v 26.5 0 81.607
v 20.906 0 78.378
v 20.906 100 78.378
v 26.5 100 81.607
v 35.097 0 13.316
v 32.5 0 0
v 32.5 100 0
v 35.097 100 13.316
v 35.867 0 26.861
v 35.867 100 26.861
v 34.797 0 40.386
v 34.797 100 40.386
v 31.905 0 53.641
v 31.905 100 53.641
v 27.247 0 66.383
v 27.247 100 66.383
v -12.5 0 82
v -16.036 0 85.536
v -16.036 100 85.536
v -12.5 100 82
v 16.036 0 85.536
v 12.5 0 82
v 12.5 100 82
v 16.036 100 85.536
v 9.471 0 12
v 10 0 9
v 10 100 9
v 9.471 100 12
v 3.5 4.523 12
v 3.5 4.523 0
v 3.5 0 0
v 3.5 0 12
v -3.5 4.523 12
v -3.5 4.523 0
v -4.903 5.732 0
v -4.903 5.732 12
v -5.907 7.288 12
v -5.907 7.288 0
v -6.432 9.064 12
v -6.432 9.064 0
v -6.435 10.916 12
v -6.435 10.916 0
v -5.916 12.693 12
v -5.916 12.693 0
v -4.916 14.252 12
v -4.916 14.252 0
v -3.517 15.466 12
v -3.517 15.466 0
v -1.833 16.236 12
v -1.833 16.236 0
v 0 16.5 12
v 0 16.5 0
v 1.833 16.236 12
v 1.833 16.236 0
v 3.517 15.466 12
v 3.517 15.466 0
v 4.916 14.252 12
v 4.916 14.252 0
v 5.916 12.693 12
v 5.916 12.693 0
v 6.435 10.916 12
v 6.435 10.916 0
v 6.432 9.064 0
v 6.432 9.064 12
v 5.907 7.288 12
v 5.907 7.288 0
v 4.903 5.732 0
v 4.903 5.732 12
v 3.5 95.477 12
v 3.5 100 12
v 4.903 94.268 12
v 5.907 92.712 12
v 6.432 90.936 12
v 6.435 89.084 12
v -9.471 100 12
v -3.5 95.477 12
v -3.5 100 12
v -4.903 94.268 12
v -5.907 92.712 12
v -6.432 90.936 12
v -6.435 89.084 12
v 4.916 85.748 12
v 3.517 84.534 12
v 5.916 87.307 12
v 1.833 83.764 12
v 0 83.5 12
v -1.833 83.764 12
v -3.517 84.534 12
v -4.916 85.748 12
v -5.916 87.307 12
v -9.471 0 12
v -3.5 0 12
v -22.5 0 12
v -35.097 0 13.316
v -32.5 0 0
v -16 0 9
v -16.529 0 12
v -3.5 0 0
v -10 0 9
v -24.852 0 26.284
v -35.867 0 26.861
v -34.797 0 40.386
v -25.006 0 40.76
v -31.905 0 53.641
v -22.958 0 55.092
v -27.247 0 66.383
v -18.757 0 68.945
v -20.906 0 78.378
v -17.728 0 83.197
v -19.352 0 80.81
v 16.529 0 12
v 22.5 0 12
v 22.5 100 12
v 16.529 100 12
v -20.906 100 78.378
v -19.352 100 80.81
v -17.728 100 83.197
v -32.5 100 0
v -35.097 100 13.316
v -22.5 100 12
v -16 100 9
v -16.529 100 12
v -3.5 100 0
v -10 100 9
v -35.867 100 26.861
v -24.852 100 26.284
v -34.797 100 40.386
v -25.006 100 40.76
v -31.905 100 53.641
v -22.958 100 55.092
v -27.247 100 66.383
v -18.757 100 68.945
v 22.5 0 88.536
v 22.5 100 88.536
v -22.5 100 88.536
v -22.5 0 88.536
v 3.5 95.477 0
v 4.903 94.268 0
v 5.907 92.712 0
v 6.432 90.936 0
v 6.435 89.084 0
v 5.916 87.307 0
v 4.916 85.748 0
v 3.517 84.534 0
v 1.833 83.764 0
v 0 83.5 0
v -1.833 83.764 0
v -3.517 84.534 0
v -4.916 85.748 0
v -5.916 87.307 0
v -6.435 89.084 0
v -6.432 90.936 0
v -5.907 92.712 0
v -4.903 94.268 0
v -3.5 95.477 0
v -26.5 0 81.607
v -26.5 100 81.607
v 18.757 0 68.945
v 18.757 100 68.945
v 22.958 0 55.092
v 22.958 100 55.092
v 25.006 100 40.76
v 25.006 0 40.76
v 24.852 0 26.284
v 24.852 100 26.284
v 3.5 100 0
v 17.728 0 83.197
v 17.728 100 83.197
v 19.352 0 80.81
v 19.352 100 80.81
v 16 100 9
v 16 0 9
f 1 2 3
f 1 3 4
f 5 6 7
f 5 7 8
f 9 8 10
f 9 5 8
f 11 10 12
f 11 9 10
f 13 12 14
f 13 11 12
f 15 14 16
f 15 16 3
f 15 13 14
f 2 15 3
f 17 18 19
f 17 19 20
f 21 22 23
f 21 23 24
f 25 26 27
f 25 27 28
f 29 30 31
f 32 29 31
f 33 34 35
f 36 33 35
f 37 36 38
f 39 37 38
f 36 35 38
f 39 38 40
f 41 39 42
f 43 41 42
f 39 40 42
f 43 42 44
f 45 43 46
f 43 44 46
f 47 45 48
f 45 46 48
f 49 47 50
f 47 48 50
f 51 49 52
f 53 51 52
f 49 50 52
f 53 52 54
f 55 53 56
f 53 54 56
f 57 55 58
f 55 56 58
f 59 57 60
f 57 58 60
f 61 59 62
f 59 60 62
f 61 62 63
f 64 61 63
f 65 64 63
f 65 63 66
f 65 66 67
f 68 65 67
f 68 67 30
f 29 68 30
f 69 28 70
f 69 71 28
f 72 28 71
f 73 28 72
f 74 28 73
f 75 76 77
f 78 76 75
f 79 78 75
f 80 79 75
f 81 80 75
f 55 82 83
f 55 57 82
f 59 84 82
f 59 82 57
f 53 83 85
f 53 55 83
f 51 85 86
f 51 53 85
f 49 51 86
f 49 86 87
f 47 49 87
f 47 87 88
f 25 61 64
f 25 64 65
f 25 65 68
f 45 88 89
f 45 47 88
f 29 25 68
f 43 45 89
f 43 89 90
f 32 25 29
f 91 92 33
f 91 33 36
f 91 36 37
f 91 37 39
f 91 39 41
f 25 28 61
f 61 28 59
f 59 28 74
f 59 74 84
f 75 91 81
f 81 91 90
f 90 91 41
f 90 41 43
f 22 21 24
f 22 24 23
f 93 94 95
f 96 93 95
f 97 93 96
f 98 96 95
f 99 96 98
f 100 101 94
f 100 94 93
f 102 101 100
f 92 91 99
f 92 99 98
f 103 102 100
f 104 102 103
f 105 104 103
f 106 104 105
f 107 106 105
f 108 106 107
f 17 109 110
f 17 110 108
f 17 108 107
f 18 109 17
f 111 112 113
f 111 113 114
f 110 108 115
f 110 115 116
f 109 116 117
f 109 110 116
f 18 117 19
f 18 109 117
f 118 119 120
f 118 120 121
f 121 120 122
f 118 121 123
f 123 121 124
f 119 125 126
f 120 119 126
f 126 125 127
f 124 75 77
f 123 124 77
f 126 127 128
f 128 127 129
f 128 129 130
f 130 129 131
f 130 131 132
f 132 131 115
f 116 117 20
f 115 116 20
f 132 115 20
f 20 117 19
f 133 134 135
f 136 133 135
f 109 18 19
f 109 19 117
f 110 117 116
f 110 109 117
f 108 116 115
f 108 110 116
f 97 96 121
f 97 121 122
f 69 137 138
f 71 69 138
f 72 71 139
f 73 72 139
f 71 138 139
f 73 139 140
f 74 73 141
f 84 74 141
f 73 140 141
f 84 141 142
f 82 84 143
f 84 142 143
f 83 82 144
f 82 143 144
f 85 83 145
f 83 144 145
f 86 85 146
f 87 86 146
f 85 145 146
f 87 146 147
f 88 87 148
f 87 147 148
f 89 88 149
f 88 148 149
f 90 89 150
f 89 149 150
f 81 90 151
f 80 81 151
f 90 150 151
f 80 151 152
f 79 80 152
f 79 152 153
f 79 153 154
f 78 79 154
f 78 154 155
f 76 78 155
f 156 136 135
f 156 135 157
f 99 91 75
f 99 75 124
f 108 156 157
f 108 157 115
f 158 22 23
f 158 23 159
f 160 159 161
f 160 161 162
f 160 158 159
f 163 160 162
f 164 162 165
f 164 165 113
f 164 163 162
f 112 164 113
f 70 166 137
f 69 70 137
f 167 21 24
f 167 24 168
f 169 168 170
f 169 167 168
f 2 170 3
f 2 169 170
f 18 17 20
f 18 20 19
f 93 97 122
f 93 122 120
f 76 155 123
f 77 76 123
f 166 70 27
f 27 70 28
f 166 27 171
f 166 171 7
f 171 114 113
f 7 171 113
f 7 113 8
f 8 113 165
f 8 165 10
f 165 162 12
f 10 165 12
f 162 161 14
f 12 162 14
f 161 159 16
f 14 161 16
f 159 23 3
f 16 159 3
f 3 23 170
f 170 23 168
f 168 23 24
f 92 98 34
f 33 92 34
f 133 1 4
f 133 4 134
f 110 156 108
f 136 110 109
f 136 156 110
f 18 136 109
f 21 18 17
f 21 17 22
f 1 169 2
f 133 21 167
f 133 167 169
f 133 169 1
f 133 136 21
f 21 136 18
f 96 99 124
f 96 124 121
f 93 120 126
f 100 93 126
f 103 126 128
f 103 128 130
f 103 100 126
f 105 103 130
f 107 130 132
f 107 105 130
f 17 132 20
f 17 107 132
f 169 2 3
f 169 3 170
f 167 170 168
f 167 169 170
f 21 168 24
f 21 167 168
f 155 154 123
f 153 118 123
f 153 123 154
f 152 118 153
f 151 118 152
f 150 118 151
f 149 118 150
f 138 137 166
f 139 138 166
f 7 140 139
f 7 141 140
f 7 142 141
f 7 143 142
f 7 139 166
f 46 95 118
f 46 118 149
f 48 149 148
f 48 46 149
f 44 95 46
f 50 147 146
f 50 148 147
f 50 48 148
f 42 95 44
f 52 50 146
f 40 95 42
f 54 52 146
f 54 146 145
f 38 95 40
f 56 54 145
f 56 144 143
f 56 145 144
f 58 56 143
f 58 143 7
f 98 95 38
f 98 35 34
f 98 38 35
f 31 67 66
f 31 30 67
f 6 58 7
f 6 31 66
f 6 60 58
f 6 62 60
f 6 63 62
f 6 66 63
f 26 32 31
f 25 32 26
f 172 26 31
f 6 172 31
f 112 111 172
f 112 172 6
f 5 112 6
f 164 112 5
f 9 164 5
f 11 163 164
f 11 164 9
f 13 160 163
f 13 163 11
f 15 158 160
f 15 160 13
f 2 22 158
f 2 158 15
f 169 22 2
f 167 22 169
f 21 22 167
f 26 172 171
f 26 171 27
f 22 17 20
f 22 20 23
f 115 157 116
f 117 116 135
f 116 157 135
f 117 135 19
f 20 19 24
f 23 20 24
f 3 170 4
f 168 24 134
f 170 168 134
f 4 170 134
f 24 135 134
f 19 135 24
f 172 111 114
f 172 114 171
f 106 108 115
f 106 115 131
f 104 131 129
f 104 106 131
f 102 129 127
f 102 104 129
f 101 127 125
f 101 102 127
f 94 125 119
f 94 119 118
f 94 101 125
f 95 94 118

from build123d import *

# Parameters (mm, degrees)
F1_DEPTH = 100
F2_DEPTH = 100
F4_DEPTH = 25


with BuildPart() as f1:
    # F0 (on Front) → F1 (new body)
    with BuildSketch(Plane.XZ):
        with BuildLine():
            Line((-16.528981, 12), (-22.5, 12))
            ThreePointArc((-22.5, 12), (-24.255455, 47.965065), (-12.5, 82))
            Line((-12.5, 82), (-16.035534, 85.535534))
            ThreePointArc((-16.035534, 85.535534), (-18.548312, 82.009344), (-20.906089, 78.377685))
            ThreePointArc((-20.906089, 78.377685), (-34.796514, 40.386058), (-32.5, 0))
            Line((-32.5, 0), (32.5, 0))
            ThreePointArc((32.5, 0), (34.796514, 40.386058), (20.906089, 78.377685))
            ThreePointArc((20.906089, 78.377685), (18.548312, 82.009344), (16.035534, 85.535534))
            Line((16.035534, 85.535534), (12.5, 82))
            ThreePointArc((12.5, 82), (24.255455, 47.965065), (22.5, 12))
            Line((22.5, 12), (16.528981, 12))
            Line((16.528981, 12), (16, 9))
            Line((16, 9), (10, 9))
            Line((10, 9), (9.471019, 12))
            Line((9.471019, 12), (-9.471019, 12))
            Line((-9.471019, 12), (-10, 9))
            Line((-10, 9), (-16, 9))
            Line((-16, 9), (-16.528981, 12))
        make_face()
    extrude(amount=-F1_DEPTH)

    # F3 (on face) → F4 (cut)
    with BuildSketch(Plane(origin=(0, 0, 0), x_dir=(1, 0, 0), z_dir=(0, 0, -1))):
        with BuildLine():
            Line((-3.5, 0), (-3.5, -4.522774))
            ThreePointArc((-3.5, -4.522774), (0, -16.5), (3.5, -4.522774))
            Line((3.5, -4.522774), (3.5, 0))
            Line((3.5, 0), (-3.5, 0))
        make_face()
        with BuildLine():
            Line((-3.5, -95.477226), (-3.5, -100))
            Line((-3.5, -100), (3.5, -100))
            Line((3.5, -100), (3.5, -95.477226))
            ThreePointArc((3.5, -95.477226), (0, -83.5), (-3.5, -95.477226))
        make_face()
    extrude(amount=-F4_DEPTH, mode=Mode.SUBTRACT)


with BuildPart() as f2:
    # F0 (on Front) → F2 (new body)
    with BuildSketch(Plane.XZ):
        with BuildLine():
            Line((-16.035534, 85.535534), (-12.5, 82))
            Line((-12.5, 82), (12.5, 82))
            Line((12.5, 82), (16.035534, 85.535534))
            ThreePointArc((16.035534, 85.535534), (18.548312, 82.009344), (20.906089, 78.377685))
            Line((20.906089, 78.377685), (26.5, 81.607331))
            Line((26.5, 81.607331), (22.5, 88.535534))
            Line((22.5, 88.535534), (-22.5, 88.535534))
            Line((-22.5, 88.535534), (-26.5, 81.607331))
            Line((-26.5, 81.607331), (-20.906089, 78.377685))
            ThreePointArc((-20.906089, 78.377685), (-18.548312, 82.009344), (-16.035534, 85.535534))
        make_face()
    extrude(amount=-F2_DEPTH)


solid = Compound([f1.part, f2.part])
